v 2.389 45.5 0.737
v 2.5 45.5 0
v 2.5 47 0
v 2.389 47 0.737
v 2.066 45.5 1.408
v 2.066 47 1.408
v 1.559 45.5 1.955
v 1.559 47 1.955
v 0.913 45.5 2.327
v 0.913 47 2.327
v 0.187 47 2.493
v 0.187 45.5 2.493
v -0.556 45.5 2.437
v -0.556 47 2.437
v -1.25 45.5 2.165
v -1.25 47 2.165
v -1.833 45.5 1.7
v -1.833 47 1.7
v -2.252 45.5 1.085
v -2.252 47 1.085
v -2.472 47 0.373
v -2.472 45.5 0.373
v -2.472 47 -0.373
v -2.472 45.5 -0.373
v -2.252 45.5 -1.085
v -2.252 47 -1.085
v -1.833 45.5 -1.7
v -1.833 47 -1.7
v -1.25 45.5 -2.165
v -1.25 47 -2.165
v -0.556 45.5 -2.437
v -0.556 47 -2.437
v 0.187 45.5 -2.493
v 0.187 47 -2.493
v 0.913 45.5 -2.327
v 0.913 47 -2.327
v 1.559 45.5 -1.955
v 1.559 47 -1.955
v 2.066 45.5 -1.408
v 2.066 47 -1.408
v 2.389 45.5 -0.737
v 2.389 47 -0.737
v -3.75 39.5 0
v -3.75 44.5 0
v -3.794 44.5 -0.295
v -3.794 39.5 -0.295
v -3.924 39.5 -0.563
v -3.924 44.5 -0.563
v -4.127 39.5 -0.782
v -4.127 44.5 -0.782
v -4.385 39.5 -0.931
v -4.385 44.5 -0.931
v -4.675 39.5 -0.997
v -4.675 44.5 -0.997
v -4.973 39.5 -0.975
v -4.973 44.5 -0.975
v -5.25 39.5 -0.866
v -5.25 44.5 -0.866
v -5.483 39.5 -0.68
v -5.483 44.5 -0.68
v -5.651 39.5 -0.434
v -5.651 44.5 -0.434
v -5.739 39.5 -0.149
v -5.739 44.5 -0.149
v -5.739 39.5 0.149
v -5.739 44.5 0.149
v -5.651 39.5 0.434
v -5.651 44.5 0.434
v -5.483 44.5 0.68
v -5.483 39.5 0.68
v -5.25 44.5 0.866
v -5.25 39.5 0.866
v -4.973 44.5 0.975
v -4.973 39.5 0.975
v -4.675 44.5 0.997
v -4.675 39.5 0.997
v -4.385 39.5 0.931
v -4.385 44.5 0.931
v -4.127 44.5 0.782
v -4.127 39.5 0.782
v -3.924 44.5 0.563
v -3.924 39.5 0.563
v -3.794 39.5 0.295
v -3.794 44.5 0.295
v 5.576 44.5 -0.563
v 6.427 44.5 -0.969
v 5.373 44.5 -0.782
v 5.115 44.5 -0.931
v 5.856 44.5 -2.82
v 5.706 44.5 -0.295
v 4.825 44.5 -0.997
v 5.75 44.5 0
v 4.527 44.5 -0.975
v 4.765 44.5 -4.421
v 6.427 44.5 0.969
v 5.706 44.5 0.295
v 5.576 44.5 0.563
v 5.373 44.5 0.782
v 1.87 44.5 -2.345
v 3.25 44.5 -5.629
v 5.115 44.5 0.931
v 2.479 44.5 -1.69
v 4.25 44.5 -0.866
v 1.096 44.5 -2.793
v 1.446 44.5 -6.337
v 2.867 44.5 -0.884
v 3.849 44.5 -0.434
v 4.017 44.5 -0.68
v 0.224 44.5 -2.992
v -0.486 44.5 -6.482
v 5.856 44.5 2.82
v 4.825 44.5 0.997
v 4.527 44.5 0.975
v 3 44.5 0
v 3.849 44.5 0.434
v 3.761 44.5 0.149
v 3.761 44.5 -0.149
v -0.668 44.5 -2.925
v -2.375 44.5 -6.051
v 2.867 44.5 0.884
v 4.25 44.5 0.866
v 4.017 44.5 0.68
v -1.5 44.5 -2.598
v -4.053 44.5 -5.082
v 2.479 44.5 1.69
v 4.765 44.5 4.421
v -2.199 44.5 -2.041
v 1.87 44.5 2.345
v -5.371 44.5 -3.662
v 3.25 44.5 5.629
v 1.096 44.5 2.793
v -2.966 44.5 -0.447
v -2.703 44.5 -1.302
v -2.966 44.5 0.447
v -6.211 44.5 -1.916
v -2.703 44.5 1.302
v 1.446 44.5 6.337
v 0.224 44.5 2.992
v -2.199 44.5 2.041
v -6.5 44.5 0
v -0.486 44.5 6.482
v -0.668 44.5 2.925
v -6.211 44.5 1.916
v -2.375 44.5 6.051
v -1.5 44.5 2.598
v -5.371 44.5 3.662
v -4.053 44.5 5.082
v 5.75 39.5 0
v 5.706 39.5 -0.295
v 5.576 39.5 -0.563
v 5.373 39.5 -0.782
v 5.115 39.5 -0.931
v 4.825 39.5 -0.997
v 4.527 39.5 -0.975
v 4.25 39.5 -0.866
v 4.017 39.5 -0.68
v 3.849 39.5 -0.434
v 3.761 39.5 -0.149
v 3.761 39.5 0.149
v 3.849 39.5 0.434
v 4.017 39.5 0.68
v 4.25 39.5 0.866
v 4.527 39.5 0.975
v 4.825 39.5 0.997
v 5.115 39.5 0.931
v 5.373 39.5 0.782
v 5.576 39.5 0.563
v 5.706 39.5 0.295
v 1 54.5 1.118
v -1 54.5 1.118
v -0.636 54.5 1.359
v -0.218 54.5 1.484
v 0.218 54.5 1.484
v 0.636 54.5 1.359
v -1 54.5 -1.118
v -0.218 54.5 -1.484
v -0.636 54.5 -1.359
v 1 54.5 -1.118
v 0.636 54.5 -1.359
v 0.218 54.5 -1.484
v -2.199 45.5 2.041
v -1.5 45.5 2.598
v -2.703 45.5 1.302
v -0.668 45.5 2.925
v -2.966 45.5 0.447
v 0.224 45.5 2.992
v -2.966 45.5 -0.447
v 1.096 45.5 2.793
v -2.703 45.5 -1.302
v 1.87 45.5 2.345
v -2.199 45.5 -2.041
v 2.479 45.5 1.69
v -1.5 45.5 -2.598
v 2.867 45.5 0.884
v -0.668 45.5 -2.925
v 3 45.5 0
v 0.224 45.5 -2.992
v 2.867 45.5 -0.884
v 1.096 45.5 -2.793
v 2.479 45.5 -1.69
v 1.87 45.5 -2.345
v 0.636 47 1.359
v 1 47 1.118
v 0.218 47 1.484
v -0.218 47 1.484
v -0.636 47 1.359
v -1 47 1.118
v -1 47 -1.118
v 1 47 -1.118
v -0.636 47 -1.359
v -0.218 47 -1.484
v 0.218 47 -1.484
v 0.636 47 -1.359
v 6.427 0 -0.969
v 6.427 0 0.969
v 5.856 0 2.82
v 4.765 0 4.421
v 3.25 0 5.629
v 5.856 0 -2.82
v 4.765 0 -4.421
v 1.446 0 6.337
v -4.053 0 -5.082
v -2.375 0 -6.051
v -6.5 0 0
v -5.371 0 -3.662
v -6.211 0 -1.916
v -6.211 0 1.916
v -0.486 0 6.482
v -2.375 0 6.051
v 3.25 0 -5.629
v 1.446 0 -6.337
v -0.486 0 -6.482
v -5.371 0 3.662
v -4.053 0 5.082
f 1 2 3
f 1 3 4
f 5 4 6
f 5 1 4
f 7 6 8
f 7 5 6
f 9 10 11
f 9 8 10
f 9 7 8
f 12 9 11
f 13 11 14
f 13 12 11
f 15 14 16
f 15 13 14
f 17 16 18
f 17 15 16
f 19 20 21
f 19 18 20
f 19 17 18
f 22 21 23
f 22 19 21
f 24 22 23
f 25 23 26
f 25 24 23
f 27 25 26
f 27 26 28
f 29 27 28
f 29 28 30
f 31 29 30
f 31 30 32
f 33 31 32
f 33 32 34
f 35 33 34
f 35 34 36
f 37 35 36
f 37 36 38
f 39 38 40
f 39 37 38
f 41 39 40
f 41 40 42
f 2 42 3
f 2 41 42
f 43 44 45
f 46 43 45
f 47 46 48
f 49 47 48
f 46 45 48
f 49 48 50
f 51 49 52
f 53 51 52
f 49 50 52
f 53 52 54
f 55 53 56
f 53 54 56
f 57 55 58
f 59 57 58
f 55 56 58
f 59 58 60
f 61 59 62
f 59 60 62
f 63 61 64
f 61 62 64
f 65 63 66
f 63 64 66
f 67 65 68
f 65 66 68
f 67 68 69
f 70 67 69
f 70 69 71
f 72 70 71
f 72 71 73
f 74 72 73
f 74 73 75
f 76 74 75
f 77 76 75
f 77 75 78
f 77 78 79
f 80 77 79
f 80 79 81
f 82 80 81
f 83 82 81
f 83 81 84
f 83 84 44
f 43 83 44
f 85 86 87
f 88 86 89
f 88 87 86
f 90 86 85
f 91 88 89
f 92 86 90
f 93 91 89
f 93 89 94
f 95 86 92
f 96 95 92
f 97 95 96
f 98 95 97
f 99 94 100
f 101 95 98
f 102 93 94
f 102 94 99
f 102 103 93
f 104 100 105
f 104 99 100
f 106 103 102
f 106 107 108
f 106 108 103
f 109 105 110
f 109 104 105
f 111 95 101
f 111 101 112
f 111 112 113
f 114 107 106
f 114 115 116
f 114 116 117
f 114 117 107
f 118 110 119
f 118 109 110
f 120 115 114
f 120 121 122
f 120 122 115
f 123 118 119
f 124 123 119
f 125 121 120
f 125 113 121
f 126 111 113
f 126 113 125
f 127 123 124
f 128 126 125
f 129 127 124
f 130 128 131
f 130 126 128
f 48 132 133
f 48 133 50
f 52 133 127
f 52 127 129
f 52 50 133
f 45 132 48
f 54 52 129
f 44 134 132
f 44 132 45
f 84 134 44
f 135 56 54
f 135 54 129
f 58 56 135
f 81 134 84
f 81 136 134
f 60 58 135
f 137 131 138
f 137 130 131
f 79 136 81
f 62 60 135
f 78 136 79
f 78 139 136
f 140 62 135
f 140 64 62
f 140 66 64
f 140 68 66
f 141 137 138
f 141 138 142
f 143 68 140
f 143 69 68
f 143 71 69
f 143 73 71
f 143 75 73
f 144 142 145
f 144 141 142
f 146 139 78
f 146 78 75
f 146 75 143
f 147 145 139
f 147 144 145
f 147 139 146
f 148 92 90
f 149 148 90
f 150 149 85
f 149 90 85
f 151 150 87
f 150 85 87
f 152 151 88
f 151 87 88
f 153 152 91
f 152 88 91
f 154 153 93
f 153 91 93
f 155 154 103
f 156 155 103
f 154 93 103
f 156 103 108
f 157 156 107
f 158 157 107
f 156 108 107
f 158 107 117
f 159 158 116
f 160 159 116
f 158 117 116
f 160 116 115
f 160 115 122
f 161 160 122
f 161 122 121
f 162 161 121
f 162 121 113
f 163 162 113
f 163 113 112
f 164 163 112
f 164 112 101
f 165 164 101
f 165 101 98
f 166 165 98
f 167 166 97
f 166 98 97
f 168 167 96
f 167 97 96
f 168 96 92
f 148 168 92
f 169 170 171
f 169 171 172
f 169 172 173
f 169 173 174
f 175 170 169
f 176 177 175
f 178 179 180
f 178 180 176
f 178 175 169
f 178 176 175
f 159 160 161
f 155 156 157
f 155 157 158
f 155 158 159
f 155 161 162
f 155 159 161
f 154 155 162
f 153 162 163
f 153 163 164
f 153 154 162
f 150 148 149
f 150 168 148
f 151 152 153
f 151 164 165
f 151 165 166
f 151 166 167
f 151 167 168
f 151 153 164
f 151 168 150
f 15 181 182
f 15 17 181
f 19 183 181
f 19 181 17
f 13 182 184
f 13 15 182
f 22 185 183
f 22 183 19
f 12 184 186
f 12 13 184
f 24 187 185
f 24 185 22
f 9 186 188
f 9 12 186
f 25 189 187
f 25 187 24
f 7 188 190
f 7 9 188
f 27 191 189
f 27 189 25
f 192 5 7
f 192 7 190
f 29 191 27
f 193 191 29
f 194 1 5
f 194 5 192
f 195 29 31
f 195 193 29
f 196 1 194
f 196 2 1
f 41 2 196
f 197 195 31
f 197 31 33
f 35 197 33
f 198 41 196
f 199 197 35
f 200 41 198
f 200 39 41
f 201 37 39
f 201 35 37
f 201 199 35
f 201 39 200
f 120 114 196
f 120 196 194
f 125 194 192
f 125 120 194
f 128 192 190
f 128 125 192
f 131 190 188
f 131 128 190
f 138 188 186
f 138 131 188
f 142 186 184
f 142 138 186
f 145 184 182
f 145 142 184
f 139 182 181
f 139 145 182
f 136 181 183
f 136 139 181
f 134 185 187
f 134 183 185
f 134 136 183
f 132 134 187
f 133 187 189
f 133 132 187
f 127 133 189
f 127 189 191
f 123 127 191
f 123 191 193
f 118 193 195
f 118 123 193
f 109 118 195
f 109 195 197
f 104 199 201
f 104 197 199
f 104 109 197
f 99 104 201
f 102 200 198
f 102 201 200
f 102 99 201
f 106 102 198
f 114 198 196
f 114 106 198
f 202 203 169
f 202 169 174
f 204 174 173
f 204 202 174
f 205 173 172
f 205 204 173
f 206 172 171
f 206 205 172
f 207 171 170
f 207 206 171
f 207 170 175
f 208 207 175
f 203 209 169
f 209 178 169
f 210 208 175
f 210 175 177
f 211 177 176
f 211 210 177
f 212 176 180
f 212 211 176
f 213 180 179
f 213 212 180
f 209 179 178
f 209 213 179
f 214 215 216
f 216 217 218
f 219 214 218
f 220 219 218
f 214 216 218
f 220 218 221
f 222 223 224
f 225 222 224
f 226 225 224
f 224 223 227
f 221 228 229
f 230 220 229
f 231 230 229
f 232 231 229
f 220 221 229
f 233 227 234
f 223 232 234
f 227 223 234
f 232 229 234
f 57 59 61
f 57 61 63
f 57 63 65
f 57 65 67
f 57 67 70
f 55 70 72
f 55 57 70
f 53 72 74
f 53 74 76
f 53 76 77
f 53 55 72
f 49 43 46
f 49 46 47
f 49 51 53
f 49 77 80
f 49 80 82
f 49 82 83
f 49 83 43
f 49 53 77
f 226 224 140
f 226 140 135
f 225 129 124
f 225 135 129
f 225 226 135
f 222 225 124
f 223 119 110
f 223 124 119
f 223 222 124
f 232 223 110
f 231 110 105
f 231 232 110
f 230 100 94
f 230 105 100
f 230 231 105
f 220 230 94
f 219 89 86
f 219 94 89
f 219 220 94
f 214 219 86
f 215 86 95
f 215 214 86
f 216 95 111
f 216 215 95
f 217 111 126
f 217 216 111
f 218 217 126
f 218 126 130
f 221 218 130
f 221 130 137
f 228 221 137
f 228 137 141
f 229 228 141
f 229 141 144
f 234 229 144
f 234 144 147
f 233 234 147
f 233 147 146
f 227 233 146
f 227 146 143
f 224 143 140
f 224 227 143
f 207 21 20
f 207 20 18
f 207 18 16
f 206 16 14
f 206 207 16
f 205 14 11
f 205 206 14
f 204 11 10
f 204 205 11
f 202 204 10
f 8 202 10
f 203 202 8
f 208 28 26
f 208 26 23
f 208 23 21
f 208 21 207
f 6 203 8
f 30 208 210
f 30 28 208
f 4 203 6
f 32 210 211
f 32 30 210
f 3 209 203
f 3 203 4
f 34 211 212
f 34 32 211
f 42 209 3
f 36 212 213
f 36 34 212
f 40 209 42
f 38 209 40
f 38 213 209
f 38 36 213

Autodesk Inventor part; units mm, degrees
ref_plane "YZ Plane" through (0, 0, 0) normal (1, 0, 0) x (0, 1, 0)
ref_plane "XZ Plane" through (0, 0, 0) normal (0, 1, 0) x (-1, 0, 0)
ref_plane "XY Plane" through (0, 0, 0) normal (0, 0, 1) x (1, 0, 0)
sketch "草图1" plane through (0, 0, 0) normal (0, 1, 0) x (-1, 0, 0)
  circle A0 centre (0, 0) radius 6.5
  dimension "d0" = 13
extrude "拉伸1" add sketch "草图1" along normal blind 44.5
sketch "草图2" plane through (0, 44.5, 0) normal (0, 1, 0) x (1, 0, 0)
  circle A0 centre (0, 0) radius 3
  dimension "d3" = 6
extrude "拉伸2" add sketch "草图2" along normal blind 1
sketch "草图3" plane through (0, 45.5, 0) normal (0, 1, 0) x (1, 0, 0)
  circle A0 centre (0, 0) radius 2.5
  dimension "d6" = 5
extrude "拉伸3" add sketch "草图3" along normal blind 1.5
sketch "草图4" plane through (0, 47, 0) normal (0, 1, 0) x (1, 0, 0)
  circle A0 centre (0, 0) radius 1.5
  dimension "d9" = 3
extrude "拉伸4" add sketch "草图4" along normal blind 7.5
sketch "草图5" plane through (0, 54.5, 0) normal (0, 1, 0) x (1, 0, 0)
  circle A0 centre (0, 0) radius 1.5 projected
  line L0 (0, 0) -> (1, 0)
  line L1 (0, 0) -> (-1, 0)
  line L2 (-1, 0) -> (-1, 1.118)
  circle A1 centre (0, 0) radius 1.5 projected
  line L3 (-1, 0) -> (-1, -1.118)
  line L4 (1, 0) -> (1, -1.118)
  line L5 (1, 0) -> (1, 1.118)
  line L6 (-1, -1.118) -> (-1, 1.118)
  line L7 (1, 1.118) -> (1, -1.118)
  arc A2 (1, -1.118) -> (1, 1.118) centre (0, 0) ccw
  arc A3 (-1, 1.118) -> (-1, -1.118) centre (0, 0) ccw
  dimension "d12" = 1
  dimension "d13" = 1
  dimension "d14" = 1.5
  dimension "d15" = 1.5
extrude "拉伸5" cut sketch "草图5" against normal up to surface (7.5 mm away) contours A0 L4 L5 | L2 L3 A0
sketch "草图6" plane through (0, 44.5, 0) normal (0, 1, 0) x (1, 0, 0)
  circle A0 centre (0, 0) radius 3 projected
  circle A1 centre (0, 0) radius 6.5 projected
  line L0 (0, 0) -> (-4.75, 0)
  line L1 (0, 0) -> (4.75, 0)
  circle A2 centre (-4.75, 0) radius 1
  circle A3 centre (4.75, 0) radius 1
  dimension "d18" = 4.75
  dimension "d19" = 4.75
  dimension "d20" = 2
  dimension "d21" = 2
extrude "拉伸6" cut sketch "草图6" against normal blind 5 contours A2 | A3
properties part number "maxon_motor"
